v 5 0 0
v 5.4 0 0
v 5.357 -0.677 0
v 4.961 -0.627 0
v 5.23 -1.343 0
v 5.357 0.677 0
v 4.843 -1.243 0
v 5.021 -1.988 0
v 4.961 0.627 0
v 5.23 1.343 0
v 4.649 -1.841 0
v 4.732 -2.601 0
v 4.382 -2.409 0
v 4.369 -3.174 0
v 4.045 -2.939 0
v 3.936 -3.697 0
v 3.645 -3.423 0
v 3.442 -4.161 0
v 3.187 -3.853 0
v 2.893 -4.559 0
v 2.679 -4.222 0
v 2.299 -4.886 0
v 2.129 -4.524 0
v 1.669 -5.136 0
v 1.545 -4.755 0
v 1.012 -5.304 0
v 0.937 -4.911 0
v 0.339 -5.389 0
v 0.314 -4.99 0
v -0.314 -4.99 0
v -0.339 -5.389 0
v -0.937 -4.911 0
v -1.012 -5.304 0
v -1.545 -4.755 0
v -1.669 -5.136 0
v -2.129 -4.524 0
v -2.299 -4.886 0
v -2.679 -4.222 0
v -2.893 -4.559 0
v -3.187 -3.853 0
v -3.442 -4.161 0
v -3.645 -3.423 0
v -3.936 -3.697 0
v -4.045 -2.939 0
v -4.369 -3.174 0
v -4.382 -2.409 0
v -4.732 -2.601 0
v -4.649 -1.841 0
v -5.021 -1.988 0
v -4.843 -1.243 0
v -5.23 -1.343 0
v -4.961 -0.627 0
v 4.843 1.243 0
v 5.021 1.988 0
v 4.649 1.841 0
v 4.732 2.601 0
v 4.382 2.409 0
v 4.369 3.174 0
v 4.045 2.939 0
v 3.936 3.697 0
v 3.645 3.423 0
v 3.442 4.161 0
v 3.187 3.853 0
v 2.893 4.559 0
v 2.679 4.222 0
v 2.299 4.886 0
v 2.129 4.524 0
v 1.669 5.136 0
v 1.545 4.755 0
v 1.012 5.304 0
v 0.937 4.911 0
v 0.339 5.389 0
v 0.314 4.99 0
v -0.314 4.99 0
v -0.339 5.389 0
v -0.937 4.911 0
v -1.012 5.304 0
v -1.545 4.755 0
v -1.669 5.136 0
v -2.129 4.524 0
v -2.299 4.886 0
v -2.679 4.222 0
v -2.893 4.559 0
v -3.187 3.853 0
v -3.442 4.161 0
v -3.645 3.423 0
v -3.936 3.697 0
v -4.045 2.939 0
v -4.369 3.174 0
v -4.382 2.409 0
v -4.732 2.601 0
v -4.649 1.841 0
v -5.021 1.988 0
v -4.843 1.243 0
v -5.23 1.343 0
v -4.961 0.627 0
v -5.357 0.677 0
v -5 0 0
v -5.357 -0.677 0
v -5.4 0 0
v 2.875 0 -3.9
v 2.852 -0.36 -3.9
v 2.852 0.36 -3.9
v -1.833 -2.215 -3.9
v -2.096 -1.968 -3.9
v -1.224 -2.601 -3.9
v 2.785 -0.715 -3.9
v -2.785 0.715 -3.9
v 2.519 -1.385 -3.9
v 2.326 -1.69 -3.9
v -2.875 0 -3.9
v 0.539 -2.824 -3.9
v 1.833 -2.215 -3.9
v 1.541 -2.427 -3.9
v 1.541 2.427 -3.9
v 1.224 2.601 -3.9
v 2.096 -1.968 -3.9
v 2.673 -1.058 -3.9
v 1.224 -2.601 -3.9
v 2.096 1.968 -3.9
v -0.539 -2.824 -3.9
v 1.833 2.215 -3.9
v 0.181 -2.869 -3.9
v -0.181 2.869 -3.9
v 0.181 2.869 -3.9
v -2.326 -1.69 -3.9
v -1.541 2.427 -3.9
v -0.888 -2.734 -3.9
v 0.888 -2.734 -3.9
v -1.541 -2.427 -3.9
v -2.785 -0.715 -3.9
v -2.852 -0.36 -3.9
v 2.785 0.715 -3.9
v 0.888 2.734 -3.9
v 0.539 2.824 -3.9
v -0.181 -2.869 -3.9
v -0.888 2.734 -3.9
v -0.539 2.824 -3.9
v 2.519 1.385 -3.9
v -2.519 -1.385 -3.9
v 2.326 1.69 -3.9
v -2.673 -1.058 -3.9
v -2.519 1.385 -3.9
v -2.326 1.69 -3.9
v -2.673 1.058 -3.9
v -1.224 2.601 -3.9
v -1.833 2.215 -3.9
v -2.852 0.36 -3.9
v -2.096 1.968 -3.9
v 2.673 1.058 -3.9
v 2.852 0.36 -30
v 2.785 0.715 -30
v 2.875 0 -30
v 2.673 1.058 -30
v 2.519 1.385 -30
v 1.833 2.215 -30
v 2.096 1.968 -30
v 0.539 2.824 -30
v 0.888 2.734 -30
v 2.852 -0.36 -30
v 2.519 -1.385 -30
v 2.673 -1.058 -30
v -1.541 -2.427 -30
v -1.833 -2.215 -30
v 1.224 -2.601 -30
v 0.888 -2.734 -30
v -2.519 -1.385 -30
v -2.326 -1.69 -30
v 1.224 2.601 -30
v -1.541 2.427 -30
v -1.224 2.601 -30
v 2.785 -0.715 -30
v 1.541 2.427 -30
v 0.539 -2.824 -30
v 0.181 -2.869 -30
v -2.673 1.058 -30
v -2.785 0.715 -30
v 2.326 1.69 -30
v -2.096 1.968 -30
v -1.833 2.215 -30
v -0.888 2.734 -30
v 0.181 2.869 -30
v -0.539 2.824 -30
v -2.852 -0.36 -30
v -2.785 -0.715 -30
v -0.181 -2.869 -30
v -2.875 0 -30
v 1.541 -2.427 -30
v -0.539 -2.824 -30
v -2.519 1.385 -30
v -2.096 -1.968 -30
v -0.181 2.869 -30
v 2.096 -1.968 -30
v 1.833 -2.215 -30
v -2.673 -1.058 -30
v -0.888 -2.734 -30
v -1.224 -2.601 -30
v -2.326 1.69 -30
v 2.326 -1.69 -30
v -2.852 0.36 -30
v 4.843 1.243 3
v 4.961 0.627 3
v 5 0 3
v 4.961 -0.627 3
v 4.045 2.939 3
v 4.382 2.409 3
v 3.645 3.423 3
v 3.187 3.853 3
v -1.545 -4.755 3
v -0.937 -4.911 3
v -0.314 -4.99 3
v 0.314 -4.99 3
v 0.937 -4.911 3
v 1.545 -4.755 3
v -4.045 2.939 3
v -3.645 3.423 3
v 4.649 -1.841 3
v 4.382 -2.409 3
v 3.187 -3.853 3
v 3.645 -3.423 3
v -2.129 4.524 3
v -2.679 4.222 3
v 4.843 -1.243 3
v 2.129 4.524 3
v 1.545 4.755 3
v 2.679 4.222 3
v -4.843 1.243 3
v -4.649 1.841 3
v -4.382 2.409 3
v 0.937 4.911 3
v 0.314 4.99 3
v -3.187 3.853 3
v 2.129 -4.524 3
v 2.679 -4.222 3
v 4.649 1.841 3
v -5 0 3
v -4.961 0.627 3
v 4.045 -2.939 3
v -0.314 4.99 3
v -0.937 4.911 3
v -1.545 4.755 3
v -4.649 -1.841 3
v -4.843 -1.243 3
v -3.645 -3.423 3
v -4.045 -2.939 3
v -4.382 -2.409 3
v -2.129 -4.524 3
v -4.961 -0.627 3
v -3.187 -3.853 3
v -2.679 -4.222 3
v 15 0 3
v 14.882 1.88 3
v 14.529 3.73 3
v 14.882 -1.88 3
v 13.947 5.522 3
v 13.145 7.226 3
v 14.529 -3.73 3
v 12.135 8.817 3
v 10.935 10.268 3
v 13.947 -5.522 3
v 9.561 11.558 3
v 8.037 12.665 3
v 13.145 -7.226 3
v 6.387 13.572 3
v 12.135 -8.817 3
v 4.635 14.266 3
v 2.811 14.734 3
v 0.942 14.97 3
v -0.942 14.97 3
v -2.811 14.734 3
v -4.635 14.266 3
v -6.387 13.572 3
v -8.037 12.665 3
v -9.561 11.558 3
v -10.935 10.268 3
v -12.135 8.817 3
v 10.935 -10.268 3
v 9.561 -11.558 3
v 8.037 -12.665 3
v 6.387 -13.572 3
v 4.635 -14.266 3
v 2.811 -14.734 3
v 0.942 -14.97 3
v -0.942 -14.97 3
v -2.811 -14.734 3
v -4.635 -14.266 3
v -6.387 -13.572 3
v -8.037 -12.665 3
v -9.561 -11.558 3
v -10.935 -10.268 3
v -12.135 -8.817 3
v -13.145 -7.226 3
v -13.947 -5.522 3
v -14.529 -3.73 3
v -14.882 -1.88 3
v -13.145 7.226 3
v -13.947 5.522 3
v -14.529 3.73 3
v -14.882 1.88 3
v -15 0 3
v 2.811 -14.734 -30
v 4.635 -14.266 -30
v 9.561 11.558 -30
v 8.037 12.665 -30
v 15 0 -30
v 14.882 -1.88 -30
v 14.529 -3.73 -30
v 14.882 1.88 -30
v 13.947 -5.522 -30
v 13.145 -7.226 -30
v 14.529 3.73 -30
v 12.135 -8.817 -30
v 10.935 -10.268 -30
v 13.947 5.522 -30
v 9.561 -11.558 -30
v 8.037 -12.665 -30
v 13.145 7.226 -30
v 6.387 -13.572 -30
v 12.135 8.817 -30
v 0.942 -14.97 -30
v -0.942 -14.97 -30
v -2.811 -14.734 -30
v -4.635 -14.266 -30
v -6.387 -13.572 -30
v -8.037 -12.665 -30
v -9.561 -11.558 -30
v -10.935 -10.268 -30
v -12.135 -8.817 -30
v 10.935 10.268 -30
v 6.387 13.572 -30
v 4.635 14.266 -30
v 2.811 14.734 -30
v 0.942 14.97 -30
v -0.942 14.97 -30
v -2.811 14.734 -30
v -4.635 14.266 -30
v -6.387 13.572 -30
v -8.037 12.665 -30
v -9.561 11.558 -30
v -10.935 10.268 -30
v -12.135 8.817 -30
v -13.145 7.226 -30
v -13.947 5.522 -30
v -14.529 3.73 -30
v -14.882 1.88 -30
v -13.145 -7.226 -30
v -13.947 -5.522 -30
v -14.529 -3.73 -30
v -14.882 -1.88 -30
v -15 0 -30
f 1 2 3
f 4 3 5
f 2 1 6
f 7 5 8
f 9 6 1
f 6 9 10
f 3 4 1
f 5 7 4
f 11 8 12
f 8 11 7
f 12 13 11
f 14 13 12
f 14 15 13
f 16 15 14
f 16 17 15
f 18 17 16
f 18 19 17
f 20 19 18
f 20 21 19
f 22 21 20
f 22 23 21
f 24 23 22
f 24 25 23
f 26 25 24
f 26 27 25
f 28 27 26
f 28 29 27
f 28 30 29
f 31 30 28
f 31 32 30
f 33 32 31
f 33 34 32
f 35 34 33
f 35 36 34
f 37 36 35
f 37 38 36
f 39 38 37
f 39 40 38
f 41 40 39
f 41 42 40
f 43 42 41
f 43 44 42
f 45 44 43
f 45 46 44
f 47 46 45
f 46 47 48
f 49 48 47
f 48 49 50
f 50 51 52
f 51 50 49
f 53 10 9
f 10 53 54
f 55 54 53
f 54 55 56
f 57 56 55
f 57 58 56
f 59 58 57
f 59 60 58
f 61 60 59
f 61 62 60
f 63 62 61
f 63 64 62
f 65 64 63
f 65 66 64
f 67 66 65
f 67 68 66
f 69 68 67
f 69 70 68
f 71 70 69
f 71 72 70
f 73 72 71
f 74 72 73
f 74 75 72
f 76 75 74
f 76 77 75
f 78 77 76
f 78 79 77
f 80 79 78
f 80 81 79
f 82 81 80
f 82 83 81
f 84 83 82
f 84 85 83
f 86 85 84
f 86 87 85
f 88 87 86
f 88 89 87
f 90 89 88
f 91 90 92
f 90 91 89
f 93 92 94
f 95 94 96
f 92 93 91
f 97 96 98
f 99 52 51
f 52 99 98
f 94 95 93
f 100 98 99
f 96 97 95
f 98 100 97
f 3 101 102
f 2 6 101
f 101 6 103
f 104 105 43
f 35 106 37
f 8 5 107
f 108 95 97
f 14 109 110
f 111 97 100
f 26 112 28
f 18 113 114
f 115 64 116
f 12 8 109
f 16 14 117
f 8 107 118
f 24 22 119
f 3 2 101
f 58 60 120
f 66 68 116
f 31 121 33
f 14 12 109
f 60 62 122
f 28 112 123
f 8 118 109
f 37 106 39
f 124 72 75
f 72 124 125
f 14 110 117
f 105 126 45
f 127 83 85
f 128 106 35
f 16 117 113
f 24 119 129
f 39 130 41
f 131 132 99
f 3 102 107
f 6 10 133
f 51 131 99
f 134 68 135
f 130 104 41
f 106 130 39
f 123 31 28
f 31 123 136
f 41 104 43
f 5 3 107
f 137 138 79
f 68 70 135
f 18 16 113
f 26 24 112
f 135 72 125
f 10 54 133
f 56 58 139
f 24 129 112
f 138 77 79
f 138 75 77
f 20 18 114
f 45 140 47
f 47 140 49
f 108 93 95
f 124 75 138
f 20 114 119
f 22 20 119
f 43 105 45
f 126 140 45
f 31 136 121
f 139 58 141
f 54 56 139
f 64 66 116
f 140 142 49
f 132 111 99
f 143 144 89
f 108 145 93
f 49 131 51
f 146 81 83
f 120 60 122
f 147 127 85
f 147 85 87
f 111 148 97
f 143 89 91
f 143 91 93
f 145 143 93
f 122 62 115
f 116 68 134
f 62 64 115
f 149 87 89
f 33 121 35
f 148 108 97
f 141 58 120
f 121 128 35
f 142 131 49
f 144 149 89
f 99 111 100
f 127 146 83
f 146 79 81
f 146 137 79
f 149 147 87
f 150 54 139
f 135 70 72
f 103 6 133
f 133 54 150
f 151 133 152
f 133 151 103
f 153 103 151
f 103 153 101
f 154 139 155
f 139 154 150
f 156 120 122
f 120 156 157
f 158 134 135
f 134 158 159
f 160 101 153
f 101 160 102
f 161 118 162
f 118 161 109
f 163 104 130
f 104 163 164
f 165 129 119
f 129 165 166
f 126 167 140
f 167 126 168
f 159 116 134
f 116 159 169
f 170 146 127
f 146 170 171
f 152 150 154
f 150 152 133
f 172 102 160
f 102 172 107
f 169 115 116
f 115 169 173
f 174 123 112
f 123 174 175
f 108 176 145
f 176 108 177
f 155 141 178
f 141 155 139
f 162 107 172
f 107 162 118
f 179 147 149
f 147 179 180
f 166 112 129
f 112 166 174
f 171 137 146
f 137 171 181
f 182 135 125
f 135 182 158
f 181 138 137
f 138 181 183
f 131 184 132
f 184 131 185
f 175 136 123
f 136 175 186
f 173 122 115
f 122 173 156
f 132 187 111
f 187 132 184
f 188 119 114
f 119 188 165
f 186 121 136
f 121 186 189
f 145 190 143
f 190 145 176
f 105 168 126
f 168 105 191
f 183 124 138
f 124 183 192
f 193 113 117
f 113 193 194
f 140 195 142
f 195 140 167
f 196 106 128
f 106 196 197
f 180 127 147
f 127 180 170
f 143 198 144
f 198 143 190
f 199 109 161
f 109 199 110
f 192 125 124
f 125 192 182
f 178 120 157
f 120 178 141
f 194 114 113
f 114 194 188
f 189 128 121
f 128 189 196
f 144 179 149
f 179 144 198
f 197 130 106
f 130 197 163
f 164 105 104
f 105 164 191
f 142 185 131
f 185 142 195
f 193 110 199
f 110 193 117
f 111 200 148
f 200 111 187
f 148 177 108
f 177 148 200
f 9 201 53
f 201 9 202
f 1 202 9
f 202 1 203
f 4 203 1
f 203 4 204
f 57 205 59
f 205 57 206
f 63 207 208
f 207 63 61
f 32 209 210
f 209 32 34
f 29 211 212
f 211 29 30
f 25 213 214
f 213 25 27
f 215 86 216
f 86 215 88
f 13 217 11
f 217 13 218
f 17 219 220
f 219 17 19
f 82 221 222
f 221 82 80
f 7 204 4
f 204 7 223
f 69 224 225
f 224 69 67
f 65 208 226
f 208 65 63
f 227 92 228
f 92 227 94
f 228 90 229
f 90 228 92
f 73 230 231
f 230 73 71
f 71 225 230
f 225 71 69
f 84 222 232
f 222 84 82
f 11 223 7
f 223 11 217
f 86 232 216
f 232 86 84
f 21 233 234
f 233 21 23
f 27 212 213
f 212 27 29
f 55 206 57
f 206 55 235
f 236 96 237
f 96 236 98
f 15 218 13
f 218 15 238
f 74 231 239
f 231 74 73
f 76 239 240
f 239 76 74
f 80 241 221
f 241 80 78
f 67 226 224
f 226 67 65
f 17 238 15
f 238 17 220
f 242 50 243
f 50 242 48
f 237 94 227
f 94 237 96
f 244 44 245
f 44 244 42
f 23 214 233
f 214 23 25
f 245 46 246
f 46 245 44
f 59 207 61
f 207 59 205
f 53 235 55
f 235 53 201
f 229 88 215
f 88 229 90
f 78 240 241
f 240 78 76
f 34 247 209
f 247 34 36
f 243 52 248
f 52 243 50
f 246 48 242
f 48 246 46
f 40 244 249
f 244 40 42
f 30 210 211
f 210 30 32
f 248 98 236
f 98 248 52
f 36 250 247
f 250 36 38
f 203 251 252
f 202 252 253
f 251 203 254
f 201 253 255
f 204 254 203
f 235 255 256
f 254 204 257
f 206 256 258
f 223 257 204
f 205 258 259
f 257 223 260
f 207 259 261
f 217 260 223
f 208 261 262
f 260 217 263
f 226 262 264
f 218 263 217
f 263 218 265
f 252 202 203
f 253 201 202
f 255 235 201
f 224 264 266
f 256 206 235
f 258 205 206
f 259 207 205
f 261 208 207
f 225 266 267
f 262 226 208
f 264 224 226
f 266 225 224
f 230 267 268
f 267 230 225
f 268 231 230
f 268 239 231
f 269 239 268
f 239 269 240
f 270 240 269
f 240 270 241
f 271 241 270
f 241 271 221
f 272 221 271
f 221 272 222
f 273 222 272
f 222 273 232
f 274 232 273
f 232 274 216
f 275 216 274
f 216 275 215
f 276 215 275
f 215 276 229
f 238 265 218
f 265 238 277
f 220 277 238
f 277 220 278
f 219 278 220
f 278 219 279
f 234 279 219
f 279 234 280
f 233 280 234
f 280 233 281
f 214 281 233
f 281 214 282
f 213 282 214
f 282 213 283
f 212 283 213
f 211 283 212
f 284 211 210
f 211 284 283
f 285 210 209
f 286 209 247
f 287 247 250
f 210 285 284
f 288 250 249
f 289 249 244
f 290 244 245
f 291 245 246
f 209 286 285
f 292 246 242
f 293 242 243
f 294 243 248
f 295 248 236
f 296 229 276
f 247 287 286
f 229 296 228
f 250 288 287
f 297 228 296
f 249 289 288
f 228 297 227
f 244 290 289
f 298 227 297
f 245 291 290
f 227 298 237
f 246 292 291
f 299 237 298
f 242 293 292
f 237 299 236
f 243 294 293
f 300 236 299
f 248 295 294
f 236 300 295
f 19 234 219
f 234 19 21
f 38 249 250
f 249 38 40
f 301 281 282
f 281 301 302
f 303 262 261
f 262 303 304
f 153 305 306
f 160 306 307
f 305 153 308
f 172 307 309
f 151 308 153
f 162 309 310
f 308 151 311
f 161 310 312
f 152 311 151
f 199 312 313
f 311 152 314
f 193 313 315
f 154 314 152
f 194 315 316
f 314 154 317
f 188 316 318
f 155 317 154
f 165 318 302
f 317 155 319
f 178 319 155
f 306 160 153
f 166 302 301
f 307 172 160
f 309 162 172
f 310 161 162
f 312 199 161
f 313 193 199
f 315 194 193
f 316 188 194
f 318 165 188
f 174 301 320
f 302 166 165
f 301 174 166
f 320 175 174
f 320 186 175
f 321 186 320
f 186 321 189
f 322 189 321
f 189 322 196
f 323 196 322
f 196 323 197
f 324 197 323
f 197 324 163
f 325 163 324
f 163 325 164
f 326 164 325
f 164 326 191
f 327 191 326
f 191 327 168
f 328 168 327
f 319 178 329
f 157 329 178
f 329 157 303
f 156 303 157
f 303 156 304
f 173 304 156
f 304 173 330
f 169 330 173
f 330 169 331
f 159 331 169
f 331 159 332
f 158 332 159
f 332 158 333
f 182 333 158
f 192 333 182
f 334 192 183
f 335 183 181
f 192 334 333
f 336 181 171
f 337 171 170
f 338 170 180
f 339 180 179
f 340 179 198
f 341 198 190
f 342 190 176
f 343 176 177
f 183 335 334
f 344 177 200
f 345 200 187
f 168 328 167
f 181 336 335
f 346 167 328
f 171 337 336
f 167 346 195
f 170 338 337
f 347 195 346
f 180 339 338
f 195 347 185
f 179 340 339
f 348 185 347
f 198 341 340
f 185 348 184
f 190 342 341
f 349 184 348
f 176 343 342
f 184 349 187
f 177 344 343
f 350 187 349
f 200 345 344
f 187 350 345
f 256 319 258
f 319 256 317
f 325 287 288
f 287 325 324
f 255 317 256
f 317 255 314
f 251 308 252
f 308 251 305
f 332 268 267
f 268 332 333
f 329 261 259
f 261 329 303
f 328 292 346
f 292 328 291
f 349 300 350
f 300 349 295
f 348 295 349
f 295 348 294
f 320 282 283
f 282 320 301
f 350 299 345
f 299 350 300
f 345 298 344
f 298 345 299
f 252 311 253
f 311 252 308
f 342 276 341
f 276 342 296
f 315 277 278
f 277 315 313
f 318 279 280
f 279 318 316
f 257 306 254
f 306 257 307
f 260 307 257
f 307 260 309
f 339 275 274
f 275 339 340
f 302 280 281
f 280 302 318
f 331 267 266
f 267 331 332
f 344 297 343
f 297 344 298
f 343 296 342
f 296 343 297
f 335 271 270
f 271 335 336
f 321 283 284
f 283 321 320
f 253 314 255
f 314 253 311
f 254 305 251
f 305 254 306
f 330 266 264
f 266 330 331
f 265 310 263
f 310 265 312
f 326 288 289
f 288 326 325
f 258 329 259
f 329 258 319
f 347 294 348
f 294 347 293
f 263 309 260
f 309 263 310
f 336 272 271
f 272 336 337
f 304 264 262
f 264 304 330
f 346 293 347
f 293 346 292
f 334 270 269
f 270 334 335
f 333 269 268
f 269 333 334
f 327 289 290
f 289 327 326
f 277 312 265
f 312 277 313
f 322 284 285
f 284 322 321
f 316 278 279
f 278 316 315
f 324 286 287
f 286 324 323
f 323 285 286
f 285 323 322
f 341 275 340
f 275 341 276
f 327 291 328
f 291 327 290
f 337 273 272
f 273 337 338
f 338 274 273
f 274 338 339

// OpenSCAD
$fn = 50;


difference() {
	union() {
		translate(v = [0, 0, -30.0000000000]) {
			cylinder(h = 33, r = 15.0000000000);
		}
	}
	union() {
		translate(v = [0, 0, 0]) {
			rotate(a = [0, 0, 0]) {
				difference() {
					union() {
						translate(v = [0, 0, -33.0000000000]) {
							cylinder(h = 33, r = 2.6000000000);
						}
						translate(v = [0, 0, -3.9000000000]) {
							cylinder(h = 3.9000000000, r1 = 2.8750000000, r2 = 5.4000000000);
						}
						translate(v = [0, 0, -33.0000000000]) {
							cylinder(h = 33, r = 2.8750000000);
						}
						translate(v = [0, 0, -33.0000000000]) {
							cylinder(h = 33, r = 2.6000000000);
						}
					}
					union();
				}
			}
		}
		#cylinder(h = 3, r = 5.0000000000);
	}
}
